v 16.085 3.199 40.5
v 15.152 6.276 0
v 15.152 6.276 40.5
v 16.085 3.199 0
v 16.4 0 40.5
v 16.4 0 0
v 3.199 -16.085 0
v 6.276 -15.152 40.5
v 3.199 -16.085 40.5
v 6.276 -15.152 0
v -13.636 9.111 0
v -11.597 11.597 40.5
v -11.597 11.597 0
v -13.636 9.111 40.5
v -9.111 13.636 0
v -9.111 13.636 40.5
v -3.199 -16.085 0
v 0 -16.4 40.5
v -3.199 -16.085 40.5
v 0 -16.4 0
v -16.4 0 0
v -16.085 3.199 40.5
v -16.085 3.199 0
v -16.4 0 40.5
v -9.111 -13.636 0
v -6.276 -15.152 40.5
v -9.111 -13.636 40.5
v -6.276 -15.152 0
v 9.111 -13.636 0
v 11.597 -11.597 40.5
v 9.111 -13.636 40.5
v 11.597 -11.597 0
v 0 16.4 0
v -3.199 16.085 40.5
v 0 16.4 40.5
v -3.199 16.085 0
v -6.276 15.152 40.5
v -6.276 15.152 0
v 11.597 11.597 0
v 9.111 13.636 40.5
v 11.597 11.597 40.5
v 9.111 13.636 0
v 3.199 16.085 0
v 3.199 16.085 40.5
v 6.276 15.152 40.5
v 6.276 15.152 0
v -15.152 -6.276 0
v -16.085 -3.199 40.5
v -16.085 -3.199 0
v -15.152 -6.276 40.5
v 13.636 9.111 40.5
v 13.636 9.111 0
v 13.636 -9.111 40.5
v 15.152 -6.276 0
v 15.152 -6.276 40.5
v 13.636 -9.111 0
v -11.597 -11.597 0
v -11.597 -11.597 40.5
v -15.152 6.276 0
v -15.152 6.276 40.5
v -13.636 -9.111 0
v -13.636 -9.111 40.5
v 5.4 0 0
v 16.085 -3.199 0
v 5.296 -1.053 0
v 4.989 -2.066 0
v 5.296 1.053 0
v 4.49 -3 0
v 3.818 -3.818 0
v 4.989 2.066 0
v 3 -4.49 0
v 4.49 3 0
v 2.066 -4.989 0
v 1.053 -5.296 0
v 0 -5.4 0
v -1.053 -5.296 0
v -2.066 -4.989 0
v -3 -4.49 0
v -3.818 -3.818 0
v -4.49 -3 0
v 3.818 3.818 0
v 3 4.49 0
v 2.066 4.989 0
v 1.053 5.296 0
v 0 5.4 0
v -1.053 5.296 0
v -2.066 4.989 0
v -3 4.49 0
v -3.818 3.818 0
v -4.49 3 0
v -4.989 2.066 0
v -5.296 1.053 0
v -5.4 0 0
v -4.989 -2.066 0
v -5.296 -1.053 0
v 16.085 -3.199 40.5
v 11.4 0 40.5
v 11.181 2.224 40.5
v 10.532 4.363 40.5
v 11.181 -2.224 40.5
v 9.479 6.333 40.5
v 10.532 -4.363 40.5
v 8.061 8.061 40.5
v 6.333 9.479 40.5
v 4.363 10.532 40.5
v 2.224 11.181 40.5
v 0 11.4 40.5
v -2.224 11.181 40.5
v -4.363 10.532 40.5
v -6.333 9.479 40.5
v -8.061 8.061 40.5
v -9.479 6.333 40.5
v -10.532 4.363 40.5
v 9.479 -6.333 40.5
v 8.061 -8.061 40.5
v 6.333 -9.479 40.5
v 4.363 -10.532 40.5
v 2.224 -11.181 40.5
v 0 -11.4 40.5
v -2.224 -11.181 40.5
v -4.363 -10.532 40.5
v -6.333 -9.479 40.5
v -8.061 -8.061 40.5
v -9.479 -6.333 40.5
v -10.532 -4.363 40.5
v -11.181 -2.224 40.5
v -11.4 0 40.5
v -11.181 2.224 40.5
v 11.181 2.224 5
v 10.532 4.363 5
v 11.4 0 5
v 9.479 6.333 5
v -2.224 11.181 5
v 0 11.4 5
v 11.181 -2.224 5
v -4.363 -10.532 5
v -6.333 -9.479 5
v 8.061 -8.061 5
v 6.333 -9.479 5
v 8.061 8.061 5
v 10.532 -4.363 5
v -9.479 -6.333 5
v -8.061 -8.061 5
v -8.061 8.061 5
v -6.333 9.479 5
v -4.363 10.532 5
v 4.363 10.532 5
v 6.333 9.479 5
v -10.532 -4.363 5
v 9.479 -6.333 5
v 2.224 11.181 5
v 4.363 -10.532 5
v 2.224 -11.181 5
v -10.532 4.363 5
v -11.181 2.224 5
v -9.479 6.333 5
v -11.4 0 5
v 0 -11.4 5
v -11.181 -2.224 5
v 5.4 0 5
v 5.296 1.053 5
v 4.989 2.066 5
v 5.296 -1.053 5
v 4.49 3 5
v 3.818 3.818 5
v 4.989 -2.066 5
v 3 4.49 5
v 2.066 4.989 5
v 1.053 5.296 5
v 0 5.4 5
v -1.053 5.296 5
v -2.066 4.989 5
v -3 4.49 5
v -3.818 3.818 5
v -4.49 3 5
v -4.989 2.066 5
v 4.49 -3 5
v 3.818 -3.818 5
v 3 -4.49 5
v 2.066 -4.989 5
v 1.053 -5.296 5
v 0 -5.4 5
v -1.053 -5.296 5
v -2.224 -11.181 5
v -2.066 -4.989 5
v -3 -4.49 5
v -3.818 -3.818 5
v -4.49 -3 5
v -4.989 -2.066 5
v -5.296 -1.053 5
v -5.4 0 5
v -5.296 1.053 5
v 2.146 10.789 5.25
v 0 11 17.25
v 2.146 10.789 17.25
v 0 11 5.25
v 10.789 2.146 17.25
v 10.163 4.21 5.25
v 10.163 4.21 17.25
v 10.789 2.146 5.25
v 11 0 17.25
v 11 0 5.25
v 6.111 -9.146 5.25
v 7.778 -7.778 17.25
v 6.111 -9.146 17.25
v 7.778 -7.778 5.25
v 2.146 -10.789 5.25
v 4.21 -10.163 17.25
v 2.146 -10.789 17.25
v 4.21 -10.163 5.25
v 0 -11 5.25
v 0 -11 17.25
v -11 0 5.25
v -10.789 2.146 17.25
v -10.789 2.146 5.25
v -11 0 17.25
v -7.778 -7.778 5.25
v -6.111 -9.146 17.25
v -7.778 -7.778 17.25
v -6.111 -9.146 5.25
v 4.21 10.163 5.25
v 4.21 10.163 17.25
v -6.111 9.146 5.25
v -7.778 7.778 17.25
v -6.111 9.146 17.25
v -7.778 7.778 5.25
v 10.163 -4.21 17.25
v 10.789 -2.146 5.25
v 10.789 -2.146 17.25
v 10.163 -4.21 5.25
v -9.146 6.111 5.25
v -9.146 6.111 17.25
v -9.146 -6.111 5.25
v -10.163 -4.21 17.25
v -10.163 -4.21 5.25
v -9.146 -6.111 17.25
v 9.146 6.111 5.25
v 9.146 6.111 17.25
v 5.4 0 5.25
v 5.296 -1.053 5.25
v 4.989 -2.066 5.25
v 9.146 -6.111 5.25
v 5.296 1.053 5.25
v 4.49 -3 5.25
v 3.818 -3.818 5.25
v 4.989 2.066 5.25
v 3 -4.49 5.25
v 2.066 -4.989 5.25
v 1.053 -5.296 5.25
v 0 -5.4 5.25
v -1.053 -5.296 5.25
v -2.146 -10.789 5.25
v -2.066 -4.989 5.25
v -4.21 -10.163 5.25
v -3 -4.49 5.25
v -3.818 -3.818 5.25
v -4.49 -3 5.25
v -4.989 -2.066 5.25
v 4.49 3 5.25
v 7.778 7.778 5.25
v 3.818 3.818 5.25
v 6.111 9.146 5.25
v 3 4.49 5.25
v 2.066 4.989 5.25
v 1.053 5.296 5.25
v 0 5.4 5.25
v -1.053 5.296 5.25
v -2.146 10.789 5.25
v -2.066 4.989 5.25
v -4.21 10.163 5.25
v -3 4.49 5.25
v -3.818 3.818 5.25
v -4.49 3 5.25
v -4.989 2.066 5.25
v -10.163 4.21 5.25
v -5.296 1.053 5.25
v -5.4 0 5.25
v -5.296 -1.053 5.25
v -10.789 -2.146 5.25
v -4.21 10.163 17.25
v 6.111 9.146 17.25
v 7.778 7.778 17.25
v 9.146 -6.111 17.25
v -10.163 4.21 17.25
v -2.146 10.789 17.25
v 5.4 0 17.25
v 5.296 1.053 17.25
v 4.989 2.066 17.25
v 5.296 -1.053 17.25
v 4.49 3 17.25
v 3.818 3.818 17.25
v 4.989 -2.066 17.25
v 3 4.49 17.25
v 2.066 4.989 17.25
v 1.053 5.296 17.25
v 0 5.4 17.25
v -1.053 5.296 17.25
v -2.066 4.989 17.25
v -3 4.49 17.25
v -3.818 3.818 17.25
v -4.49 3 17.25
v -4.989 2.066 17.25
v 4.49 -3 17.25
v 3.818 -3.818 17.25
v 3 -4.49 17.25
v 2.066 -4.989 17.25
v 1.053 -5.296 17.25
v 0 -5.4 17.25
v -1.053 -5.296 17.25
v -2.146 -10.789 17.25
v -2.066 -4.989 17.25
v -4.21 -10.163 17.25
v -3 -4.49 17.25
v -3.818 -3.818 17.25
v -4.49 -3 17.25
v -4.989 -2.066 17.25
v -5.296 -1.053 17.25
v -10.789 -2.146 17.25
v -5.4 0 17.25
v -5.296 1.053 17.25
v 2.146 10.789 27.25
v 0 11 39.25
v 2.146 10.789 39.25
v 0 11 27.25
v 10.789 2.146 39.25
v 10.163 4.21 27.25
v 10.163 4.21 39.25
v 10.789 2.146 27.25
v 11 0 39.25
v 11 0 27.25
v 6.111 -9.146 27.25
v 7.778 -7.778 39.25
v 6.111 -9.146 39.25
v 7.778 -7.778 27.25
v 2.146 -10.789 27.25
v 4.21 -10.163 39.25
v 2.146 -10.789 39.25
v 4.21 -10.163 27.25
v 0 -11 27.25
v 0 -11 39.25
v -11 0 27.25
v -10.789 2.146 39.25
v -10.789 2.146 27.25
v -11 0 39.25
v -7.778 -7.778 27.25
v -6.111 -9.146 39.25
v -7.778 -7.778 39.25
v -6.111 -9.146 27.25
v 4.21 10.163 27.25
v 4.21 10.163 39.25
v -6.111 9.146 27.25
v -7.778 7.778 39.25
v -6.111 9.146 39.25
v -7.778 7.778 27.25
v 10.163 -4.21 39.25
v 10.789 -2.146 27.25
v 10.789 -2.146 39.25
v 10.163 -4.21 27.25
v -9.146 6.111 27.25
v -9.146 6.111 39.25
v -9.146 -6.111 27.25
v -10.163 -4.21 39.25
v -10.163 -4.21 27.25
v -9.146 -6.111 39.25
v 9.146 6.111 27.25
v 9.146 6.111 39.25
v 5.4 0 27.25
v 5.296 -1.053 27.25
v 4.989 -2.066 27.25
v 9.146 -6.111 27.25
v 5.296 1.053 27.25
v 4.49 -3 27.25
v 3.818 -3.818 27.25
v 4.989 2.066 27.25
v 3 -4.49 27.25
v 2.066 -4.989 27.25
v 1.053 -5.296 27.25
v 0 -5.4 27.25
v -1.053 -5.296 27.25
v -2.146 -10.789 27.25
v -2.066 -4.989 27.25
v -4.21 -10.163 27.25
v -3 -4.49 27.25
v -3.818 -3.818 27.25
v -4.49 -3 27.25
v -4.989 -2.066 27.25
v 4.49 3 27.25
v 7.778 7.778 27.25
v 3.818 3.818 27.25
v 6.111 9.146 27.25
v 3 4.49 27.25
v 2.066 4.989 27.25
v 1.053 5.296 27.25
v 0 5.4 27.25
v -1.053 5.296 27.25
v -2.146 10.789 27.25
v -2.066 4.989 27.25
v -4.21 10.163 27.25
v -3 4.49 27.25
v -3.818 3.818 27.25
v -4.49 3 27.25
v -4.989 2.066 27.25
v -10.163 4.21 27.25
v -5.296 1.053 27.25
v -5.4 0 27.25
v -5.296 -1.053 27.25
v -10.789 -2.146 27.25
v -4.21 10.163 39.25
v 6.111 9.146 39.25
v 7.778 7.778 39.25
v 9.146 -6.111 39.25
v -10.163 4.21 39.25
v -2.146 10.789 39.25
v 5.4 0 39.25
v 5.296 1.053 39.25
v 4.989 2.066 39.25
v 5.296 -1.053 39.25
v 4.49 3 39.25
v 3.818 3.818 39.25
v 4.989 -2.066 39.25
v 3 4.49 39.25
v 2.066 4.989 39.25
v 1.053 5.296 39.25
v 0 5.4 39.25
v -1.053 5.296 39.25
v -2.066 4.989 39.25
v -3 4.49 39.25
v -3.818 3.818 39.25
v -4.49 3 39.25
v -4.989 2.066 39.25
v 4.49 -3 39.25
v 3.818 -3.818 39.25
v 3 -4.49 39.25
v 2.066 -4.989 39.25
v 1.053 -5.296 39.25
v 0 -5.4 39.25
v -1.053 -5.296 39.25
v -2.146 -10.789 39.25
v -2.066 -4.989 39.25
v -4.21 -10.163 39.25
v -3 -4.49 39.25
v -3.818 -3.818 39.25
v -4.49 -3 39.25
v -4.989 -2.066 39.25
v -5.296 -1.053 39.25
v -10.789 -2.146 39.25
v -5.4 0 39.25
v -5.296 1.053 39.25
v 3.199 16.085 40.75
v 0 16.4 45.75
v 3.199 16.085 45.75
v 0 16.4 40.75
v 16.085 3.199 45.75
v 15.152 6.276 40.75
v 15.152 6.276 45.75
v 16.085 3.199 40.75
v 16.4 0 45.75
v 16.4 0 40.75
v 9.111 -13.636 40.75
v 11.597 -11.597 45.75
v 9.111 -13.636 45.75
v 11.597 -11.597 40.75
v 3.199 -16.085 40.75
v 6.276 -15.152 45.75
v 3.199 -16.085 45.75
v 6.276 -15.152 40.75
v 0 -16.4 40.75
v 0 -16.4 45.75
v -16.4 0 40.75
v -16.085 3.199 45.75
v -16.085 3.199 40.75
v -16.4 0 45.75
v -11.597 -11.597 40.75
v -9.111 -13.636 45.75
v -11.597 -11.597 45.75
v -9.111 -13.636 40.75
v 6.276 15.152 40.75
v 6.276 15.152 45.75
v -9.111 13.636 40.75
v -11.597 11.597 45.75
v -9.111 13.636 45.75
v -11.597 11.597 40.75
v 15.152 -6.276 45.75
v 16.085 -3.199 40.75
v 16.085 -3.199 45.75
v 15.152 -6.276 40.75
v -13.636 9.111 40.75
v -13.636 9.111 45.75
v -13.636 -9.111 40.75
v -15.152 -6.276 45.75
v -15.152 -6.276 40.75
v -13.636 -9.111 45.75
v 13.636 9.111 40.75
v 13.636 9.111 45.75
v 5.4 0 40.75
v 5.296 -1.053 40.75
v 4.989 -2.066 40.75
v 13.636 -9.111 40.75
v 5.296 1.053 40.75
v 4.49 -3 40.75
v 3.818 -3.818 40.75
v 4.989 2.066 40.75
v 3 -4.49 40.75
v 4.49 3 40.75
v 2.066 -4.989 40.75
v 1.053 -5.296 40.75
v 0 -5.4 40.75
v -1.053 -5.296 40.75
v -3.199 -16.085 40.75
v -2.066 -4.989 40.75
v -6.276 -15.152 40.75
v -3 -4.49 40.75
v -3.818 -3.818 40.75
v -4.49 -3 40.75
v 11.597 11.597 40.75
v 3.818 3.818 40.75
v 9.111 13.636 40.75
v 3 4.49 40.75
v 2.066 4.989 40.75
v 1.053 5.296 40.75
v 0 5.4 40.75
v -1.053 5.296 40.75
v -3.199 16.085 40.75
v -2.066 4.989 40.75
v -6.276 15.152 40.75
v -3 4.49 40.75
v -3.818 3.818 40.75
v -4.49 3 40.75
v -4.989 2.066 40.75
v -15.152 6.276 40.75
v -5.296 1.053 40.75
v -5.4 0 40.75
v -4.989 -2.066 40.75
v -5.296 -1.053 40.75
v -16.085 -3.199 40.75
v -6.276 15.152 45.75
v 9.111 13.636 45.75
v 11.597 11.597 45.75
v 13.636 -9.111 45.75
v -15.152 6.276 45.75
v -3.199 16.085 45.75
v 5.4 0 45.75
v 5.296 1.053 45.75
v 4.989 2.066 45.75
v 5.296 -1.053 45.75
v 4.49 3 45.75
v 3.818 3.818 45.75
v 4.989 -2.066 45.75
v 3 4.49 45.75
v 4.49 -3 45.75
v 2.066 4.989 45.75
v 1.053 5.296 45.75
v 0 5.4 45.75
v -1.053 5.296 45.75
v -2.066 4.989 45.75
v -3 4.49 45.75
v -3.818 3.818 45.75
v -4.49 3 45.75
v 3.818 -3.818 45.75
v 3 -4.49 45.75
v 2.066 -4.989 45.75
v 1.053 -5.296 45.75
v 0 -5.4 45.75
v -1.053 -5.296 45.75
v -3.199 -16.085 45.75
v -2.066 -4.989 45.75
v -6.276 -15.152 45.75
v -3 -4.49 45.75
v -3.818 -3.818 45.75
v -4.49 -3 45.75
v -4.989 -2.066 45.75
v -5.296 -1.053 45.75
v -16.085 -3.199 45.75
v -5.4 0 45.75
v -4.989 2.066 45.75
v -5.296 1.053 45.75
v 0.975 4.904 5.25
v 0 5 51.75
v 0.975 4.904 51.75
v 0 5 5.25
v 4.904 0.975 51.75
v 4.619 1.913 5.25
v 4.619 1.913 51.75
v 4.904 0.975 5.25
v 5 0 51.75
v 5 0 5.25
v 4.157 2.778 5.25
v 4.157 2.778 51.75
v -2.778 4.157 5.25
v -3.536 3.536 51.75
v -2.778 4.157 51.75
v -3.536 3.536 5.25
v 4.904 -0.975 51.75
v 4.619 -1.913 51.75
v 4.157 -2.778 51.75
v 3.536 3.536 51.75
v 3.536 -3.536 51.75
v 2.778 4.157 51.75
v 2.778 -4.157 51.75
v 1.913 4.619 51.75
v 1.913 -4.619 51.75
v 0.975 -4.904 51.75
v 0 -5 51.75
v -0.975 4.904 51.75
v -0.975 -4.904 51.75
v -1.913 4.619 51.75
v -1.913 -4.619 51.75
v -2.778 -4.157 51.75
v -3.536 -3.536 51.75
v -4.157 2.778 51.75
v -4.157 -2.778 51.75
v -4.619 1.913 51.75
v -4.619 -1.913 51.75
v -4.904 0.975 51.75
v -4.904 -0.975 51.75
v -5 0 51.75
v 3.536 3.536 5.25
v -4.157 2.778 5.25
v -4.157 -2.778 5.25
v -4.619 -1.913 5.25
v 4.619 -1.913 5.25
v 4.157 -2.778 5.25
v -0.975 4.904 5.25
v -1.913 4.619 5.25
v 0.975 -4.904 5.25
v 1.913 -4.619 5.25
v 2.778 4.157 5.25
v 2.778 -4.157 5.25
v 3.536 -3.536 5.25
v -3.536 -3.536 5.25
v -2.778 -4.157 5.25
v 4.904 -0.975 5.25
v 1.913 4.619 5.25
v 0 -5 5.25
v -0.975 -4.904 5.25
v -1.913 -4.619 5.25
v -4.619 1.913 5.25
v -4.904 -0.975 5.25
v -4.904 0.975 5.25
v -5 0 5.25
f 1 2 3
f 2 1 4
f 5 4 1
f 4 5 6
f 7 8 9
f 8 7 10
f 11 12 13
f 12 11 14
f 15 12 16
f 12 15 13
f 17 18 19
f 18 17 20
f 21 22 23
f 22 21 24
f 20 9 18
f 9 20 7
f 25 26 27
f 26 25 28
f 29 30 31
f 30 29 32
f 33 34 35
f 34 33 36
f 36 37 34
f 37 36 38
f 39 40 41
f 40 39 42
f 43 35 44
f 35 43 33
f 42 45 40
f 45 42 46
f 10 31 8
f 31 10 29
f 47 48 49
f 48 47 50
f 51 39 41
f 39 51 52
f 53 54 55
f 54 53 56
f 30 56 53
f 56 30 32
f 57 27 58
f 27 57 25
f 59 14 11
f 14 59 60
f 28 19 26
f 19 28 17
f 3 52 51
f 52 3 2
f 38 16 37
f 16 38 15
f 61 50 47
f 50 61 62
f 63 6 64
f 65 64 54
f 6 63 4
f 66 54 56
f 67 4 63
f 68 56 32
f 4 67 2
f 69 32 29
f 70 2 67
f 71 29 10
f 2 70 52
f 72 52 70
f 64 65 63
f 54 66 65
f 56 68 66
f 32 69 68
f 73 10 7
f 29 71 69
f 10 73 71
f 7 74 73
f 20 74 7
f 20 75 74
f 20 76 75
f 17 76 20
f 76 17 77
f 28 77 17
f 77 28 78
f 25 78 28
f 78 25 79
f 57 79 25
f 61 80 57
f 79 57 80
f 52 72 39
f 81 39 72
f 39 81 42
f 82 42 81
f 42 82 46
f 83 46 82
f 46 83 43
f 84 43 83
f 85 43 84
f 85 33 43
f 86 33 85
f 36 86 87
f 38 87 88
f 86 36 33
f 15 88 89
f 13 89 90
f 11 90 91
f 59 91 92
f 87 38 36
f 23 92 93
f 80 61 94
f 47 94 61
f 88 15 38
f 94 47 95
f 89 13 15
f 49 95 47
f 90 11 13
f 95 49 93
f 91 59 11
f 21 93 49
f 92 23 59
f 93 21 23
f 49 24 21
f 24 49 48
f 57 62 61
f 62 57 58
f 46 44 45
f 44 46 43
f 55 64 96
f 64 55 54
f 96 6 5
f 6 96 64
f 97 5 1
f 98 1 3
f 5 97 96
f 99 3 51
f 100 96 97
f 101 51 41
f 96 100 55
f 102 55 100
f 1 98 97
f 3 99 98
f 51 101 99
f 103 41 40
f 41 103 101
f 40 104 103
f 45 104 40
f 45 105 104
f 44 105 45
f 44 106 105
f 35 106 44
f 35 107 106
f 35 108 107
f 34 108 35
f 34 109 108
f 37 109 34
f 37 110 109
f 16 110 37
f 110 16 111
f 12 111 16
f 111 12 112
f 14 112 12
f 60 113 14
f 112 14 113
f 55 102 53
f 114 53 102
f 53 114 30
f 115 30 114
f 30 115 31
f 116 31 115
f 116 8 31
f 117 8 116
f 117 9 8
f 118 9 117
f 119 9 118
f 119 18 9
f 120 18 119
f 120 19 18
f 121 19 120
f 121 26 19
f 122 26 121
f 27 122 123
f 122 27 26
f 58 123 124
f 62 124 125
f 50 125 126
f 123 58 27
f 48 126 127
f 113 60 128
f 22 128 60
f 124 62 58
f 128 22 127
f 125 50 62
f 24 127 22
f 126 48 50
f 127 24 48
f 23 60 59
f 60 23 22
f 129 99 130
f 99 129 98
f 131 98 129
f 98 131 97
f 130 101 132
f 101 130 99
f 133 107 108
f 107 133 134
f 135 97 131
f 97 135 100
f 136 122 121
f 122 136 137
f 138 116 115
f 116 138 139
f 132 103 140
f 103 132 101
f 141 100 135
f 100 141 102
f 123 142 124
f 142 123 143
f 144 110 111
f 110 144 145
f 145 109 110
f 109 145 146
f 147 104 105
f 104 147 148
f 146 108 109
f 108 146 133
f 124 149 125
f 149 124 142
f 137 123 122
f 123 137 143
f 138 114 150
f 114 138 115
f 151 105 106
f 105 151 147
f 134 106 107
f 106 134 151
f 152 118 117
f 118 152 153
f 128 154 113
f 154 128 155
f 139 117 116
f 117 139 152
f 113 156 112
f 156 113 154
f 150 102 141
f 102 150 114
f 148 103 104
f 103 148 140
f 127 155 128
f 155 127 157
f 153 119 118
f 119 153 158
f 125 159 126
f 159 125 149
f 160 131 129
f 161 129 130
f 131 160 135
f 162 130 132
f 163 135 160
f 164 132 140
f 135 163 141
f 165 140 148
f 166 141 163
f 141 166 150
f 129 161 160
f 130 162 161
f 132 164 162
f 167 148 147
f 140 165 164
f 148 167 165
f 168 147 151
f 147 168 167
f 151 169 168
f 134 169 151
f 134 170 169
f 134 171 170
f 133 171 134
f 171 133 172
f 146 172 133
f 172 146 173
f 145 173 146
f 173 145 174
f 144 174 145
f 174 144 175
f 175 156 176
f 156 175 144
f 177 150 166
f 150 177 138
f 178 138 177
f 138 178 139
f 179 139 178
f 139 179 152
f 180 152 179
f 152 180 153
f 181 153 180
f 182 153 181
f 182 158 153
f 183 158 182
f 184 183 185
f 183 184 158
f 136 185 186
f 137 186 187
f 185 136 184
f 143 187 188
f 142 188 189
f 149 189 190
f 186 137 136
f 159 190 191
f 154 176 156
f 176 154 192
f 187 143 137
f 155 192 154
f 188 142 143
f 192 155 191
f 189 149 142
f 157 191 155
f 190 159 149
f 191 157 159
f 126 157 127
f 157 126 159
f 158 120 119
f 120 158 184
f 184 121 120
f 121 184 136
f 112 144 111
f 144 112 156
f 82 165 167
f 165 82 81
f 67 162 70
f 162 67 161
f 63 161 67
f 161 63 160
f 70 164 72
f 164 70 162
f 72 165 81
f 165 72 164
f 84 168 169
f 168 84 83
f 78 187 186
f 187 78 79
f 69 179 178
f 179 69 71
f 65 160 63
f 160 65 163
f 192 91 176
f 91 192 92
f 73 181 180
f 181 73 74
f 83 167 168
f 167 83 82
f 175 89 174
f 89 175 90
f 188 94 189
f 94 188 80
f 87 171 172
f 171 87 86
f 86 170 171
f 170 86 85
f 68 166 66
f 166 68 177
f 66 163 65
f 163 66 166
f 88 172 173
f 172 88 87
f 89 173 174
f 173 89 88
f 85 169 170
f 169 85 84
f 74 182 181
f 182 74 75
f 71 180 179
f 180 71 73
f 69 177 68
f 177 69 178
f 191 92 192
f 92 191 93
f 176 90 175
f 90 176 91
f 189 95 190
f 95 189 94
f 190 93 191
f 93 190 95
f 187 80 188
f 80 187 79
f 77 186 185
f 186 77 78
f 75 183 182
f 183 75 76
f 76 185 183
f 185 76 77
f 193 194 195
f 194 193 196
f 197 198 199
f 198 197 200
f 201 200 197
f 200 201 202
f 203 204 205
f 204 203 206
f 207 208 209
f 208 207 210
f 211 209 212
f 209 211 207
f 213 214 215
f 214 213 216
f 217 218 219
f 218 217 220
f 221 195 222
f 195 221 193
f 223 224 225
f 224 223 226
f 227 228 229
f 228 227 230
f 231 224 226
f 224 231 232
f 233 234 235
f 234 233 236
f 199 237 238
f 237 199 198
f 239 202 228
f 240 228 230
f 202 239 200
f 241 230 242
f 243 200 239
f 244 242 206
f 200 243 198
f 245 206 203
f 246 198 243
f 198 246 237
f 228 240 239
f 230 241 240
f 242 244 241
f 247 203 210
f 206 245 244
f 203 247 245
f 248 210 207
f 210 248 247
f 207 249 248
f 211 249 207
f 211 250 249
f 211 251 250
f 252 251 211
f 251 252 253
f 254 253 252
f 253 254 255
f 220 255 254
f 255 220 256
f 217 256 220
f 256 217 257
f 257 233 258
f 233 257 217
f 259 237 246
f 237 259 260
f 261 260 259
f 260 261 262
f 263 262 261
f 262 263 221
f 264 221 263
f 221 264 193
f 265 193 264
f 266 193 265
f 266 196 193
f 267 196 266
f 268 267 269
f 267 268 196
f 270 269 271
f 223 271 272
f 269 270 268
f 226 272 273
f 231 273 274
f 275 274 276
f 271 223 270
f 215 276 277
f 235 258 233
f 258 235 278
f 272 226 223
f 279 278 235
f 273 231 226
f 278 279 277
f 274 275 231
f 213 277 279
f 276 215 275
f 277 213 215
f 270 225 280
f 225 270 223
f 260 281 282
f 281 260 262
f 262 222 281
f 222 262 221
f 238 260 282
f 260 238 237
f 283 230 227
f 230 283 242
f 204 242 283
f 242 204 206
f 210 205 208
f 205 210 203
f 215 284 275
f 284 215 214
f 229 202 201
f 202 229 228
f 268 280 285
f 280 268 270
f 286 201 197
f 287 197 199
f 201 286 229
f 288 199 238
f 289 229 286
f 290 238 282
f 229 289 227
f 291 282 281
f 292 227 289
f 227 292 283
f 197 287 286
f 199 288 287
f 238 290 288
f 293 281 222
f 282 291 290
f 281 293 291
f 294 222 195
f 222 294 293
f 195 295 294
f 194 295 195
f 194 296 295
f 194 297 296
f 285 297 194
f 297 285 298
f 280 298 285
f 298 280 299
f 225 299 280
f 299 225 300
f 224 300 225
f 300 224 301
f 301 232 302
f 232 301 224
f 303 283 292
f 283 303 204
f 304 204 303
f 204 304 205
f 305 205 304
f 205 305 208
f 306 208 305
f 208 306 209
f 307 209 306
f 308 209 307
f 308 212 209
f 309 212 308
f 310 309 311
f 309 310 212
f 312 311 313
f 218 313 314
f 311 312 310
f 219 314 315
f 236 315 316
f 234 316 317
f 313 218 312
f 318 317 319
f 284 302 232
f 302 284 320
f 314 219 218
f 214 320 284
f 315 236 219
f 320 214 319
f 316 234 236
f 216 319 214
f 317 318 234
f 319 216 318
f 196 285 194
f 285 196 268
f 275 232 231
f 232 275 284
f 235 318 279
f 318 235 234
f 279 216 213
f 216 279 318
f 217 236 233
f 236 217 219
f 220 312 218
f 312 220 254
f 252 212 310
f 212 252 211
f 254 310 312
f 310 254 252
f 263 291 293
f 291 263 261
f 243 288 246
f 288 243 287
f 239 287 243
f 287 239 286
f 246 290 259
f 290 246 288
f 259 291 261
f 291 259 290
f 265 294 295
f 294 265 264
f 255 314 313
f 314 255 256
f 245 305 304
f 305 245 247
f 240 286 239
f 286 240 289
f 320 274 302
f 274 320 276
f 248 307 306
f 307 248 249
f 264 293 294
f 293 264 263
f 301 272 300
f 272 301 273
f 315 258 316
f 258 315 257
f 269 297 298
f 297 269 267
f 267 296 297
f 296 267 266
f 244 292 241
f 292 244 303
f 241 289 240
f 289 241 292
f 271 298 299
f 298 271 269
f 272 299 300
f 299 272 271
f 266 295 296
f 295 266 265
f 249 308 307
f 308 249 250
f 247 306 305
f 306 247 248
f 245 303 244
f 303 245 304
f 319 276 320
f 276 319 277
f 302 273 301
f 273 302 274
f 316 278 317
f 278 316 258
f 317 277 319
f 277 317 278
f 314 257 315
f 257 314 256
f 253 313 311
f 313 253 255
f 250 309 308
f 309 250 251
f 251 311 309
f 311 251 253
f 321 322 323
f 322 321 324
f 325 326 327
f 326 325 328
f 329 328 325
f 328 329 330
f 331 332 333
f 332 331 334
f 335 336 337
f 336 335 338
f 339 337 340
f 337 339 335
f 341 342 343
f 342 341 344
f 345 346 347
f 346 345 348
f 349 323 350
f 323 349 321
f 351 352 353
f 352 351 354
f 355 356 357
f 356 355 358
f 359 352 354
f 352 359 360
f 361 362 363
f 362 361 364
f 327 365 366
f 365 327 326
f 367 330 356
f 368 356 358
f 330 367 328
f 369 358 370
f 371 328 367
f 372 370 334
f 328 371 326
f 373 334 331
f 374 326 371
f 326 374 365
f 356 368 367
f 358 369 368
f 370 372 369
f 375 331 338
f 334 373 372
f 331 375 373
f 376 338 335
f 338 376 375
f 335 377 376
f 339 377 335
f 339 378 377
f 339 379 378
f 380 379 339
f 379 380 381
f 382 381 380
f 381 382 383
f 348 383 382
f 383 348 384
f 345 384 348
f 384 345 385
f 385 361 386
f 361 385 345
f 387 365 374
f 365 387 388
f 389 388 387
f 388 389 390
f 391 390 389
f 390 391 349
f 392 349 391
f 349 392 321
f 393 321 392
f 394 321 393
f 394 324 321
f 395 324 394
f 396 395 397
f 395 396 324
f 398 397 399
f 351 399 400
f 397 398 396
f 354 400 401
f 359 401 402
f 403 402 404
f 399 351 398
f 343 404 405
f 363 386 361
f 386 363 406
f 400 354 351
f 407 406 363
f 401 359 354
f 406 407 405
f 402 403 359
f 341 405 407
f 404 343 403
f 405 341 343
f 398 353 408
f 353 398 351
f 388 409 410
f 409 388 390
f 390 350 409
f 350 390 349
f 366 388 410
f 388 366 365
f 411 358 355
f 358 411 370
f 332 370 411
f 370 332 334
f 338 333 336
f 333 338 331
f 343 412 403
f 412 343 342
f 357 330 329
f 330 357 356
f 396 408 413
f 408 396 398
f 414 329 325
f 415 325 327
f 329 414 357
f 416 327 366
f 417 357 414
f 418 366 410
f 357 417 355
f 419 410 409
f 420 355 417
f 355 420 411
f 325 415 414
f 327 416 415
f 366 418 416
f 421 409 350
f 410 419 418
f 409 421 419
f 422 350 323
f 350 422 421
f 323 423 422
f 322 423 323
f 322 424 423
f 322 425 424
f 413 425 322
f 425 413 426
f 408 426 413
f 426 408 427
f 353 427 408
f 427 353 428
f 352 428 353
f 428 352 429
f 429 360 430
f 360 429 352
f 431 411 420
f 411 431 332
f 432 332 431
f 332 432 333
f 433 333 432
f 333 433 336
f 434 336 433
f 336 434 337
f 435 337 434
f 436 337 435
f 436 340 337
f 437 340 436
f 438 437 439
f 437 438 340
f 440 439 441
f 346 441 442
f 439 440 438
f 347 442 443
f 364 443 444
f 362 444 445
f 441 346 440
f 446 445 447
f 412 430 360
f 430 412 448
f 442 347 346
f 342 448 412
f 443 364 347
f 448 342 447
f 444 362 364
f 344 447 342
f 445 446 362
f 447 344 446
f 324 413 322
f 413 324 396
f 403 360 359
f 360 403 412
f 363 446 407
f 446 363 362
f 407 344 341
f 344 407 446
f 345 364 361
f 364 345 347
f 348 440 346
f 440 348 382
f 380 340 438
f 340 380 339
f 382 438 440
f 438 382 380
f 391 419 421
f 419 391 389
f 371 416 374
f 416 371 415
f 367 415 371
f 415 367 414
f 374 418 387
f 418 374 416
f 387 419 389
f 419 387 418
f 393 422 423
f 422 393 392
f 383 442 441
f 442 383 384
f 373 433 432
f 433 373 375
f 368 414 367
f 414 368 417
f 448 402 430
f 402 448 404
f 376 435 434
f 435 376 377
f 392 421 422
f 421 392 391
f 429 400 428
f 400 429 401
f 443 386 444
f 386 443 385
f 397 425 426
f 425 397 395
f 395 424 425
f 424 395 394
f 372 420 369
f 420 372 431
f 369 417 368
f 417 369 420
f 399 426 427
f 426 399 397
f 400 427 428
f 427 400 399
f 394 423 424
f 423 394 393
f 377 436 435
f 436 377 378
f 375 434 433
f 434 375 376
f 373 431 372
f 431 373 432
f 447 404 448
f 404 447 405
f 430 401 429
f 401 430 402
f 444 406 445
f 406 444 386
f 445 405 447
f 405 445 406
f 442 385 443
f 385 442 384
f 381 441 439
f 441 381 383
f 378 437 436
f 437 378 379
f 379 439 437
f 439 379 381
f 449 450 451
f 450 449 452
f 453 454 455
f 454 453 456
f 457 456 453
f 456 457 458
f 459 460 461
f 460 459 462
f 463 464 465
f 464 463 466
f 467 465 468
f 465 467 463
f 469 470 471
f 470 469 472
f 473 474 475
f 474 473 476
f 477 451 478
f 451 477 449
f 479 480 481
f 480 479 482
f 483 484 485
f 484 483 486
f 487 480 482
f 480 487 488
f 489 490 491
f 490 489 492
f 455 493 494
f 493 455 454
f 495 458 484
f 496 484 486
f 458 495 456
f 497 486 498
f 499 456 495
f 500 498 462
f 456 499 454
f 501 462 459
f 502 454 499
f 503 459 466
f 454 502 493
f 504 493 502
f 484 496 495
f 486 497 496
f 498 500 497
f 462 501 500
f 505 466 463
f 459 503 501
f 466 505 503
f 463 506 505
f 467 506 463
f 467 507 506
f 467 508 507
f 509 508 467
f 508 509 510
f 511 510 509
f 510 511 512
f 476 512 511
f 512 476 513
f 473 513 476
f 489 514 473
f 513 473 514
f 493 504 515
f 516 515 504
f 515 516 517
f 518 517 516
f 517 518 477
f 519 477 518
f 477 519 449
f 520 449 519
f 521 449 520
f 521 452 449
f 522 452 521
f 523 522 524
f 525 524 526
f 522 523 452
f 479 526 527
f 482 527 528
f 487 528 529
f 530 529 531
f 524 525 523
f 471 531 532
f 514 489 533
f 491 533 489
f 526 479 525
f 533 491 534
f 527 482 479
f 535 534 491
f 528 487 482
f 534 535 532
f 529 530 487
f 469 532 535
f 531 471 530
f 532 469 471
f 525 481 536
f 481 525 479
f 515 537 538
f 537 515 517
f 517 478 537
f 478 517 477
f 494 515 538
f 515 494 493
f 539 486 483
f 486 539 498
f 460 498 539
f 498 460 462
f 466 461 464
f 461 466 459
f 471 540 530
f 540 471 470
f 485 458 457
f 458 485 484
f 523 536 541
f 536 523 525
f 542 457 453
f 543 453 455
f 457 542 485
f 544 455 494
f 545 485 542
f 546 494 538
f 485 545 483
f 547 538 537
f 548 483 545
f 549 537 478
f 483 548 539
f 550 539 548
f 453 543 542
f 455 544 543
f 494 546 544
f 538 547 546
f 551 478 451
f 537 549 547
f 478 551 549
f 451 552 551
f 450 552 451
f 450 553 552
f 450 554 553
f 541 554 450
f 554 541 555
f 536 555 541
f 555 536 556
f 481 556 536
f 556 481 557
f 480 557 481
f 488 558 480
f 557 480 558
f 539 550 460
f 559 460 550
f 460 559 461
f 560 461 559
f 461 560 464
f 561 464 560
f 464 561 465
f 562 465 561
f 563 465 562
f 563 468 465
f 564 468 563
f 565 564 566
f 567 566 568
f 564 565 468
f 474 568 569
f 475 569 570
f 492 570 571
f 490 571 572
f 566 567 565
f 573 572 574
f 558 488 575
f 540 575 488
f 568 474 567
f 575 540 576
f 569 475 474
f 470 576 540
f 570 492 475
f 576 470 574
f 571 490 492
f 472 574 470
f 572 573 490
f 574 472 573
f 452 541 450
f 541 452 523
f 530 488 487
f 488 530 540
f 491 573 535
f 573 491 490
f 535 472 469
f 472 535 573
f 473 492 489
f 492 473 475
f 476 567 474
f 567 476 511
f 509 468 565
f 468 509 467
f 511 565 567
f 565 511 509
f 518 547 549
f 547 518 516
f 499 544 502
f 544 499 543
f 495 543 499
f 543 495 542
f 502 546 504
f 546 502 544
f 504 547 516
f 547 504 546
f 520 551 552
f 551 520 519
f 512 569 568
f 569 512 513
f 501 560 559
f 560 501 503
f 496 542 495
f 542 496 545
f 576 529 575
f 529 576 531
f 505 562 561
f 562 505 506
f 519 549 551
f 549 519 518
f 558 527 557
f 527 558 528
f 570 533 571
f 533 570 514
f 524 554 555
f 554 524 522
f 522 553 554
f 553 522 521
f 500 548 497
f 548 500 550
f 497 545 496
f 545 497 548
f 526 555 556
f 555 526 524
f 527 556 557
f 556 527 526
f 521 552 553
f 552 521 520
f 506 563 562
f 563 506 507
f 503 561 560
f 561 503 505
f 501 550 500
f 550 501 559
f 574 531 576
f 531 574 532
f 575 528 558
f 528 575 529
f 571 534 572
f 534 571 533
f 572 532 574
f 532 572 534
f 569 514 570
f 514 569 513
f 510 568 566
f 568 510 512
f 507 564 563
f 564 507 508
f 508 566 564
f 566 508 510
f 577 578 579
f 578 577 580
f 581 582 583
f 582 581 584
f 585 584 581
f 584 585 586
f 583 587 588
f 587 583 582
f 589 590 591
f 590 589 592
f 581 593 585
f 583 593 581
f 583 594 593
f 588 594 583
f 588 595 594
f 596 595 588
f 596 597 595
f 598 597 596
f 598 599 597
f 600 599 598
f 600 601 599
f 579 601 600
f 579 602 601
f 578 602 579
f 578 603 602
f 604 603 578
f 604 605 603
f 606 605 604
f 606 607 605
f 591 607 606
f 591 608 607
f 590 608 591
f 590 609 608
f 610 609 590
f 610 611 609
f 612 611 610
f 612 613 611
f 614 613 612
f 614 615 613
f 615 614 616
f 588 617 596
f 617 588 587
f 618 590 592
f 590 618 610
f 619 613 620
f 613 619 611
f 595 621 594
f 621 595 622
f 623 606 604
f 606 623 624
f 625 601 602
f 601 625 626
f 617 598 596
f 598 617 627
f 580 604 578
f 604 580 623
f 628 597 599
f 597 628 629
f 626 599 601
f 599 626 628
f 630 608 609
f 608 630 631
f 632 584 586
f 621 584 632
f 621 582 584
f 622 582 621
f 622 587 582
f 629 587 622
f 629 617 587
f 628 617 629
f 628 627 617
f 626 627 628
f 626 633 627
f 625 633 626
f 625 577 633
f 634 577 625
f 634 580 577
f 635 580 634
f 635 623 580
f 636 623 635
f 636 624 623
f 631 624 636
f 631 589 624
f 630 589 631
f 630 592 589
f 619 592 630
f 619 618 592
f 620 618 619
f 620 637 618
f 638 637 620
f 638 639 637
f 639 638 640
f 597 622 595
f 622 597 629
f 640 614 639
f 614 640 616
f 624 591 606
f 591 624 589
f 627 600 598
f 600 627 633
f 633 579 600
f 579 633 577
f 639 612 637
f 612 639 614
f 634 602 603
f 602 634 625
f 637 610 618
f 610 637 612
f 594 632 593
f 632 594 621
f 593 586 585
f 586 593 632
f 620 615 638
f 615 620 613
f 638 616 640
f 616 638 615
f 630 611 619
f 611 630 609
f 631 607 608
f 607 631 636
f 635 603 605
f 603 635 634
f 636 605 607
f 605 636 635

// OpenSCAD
$fn = 32;

// ------------------------------------------------------------------------
// Shaft station: cup d32.8 x 40.5 mm, shaft d10
// Every part is its own module, assembly() places every instance.
// ------------------------------------------------------------------------

// --- part 1 ---
module housing_cup() {
  difference() {
    cylinder(h = 40.5, d = 32.8);
    translate([0, 0, 5]) cylinder(h = 36.5, d = 22.8);
    translate([0, 0, -1]) cylinder(h = 7, d = 10.8);
  }
}

// --- part 2 ---
module bearing_lower() {
  difference() {
      translate([0, 0, 0]) cylinder(h = 12, d = 22);
      translate([0, 0, -1]) cylinder(h = 14, d = 10.8);
    }
}

// --- part 3 ---
module bearing_upper() {
  difference() {
      translate([0, 0, 0]) cylinder(h = 12, d = 22);
      translate([0, 0, -1]) cylinder(h = 14, d = 10.8);
    }
}

// --- part 4 ---
module station_shaft() {
  translate([0, 0, -23.25]) cylinder(h = 46.5, d = 10);
}

// --- part 5 ---
module station_cover() {
  difference() {
    cylinder(h = 5, d = 32.8);
    translate([0, 0, -1]) cylinder(h = 7, d = 10.8);
  }
}

// --- assembly ---
module assembly() {
  color([0.80, 0.24, 0.20]) translate([0, 0, 0]) rotate([0, 0, 0]) housing_cup();
  color([0.20, 0.45, 0.75]) translate([0, 0, 5.25]) rotate([0, 0, 0]) bearing_lower();
  color([0.25, 0.62, 0.32]) translate([0, 0, 27.25]) rotate([0, 0, 0]) bearing_upper();
  color([0.92, 0.70, 0.18]) translate([0, 0, 28.5]) rotate([0, 0, 0]) station_shaft();
  color([0.58, 0.35, 0.70]) translate([0, 0, 40.75]) rotate([0, 0, 0]) station_cover();
}

assembly();
